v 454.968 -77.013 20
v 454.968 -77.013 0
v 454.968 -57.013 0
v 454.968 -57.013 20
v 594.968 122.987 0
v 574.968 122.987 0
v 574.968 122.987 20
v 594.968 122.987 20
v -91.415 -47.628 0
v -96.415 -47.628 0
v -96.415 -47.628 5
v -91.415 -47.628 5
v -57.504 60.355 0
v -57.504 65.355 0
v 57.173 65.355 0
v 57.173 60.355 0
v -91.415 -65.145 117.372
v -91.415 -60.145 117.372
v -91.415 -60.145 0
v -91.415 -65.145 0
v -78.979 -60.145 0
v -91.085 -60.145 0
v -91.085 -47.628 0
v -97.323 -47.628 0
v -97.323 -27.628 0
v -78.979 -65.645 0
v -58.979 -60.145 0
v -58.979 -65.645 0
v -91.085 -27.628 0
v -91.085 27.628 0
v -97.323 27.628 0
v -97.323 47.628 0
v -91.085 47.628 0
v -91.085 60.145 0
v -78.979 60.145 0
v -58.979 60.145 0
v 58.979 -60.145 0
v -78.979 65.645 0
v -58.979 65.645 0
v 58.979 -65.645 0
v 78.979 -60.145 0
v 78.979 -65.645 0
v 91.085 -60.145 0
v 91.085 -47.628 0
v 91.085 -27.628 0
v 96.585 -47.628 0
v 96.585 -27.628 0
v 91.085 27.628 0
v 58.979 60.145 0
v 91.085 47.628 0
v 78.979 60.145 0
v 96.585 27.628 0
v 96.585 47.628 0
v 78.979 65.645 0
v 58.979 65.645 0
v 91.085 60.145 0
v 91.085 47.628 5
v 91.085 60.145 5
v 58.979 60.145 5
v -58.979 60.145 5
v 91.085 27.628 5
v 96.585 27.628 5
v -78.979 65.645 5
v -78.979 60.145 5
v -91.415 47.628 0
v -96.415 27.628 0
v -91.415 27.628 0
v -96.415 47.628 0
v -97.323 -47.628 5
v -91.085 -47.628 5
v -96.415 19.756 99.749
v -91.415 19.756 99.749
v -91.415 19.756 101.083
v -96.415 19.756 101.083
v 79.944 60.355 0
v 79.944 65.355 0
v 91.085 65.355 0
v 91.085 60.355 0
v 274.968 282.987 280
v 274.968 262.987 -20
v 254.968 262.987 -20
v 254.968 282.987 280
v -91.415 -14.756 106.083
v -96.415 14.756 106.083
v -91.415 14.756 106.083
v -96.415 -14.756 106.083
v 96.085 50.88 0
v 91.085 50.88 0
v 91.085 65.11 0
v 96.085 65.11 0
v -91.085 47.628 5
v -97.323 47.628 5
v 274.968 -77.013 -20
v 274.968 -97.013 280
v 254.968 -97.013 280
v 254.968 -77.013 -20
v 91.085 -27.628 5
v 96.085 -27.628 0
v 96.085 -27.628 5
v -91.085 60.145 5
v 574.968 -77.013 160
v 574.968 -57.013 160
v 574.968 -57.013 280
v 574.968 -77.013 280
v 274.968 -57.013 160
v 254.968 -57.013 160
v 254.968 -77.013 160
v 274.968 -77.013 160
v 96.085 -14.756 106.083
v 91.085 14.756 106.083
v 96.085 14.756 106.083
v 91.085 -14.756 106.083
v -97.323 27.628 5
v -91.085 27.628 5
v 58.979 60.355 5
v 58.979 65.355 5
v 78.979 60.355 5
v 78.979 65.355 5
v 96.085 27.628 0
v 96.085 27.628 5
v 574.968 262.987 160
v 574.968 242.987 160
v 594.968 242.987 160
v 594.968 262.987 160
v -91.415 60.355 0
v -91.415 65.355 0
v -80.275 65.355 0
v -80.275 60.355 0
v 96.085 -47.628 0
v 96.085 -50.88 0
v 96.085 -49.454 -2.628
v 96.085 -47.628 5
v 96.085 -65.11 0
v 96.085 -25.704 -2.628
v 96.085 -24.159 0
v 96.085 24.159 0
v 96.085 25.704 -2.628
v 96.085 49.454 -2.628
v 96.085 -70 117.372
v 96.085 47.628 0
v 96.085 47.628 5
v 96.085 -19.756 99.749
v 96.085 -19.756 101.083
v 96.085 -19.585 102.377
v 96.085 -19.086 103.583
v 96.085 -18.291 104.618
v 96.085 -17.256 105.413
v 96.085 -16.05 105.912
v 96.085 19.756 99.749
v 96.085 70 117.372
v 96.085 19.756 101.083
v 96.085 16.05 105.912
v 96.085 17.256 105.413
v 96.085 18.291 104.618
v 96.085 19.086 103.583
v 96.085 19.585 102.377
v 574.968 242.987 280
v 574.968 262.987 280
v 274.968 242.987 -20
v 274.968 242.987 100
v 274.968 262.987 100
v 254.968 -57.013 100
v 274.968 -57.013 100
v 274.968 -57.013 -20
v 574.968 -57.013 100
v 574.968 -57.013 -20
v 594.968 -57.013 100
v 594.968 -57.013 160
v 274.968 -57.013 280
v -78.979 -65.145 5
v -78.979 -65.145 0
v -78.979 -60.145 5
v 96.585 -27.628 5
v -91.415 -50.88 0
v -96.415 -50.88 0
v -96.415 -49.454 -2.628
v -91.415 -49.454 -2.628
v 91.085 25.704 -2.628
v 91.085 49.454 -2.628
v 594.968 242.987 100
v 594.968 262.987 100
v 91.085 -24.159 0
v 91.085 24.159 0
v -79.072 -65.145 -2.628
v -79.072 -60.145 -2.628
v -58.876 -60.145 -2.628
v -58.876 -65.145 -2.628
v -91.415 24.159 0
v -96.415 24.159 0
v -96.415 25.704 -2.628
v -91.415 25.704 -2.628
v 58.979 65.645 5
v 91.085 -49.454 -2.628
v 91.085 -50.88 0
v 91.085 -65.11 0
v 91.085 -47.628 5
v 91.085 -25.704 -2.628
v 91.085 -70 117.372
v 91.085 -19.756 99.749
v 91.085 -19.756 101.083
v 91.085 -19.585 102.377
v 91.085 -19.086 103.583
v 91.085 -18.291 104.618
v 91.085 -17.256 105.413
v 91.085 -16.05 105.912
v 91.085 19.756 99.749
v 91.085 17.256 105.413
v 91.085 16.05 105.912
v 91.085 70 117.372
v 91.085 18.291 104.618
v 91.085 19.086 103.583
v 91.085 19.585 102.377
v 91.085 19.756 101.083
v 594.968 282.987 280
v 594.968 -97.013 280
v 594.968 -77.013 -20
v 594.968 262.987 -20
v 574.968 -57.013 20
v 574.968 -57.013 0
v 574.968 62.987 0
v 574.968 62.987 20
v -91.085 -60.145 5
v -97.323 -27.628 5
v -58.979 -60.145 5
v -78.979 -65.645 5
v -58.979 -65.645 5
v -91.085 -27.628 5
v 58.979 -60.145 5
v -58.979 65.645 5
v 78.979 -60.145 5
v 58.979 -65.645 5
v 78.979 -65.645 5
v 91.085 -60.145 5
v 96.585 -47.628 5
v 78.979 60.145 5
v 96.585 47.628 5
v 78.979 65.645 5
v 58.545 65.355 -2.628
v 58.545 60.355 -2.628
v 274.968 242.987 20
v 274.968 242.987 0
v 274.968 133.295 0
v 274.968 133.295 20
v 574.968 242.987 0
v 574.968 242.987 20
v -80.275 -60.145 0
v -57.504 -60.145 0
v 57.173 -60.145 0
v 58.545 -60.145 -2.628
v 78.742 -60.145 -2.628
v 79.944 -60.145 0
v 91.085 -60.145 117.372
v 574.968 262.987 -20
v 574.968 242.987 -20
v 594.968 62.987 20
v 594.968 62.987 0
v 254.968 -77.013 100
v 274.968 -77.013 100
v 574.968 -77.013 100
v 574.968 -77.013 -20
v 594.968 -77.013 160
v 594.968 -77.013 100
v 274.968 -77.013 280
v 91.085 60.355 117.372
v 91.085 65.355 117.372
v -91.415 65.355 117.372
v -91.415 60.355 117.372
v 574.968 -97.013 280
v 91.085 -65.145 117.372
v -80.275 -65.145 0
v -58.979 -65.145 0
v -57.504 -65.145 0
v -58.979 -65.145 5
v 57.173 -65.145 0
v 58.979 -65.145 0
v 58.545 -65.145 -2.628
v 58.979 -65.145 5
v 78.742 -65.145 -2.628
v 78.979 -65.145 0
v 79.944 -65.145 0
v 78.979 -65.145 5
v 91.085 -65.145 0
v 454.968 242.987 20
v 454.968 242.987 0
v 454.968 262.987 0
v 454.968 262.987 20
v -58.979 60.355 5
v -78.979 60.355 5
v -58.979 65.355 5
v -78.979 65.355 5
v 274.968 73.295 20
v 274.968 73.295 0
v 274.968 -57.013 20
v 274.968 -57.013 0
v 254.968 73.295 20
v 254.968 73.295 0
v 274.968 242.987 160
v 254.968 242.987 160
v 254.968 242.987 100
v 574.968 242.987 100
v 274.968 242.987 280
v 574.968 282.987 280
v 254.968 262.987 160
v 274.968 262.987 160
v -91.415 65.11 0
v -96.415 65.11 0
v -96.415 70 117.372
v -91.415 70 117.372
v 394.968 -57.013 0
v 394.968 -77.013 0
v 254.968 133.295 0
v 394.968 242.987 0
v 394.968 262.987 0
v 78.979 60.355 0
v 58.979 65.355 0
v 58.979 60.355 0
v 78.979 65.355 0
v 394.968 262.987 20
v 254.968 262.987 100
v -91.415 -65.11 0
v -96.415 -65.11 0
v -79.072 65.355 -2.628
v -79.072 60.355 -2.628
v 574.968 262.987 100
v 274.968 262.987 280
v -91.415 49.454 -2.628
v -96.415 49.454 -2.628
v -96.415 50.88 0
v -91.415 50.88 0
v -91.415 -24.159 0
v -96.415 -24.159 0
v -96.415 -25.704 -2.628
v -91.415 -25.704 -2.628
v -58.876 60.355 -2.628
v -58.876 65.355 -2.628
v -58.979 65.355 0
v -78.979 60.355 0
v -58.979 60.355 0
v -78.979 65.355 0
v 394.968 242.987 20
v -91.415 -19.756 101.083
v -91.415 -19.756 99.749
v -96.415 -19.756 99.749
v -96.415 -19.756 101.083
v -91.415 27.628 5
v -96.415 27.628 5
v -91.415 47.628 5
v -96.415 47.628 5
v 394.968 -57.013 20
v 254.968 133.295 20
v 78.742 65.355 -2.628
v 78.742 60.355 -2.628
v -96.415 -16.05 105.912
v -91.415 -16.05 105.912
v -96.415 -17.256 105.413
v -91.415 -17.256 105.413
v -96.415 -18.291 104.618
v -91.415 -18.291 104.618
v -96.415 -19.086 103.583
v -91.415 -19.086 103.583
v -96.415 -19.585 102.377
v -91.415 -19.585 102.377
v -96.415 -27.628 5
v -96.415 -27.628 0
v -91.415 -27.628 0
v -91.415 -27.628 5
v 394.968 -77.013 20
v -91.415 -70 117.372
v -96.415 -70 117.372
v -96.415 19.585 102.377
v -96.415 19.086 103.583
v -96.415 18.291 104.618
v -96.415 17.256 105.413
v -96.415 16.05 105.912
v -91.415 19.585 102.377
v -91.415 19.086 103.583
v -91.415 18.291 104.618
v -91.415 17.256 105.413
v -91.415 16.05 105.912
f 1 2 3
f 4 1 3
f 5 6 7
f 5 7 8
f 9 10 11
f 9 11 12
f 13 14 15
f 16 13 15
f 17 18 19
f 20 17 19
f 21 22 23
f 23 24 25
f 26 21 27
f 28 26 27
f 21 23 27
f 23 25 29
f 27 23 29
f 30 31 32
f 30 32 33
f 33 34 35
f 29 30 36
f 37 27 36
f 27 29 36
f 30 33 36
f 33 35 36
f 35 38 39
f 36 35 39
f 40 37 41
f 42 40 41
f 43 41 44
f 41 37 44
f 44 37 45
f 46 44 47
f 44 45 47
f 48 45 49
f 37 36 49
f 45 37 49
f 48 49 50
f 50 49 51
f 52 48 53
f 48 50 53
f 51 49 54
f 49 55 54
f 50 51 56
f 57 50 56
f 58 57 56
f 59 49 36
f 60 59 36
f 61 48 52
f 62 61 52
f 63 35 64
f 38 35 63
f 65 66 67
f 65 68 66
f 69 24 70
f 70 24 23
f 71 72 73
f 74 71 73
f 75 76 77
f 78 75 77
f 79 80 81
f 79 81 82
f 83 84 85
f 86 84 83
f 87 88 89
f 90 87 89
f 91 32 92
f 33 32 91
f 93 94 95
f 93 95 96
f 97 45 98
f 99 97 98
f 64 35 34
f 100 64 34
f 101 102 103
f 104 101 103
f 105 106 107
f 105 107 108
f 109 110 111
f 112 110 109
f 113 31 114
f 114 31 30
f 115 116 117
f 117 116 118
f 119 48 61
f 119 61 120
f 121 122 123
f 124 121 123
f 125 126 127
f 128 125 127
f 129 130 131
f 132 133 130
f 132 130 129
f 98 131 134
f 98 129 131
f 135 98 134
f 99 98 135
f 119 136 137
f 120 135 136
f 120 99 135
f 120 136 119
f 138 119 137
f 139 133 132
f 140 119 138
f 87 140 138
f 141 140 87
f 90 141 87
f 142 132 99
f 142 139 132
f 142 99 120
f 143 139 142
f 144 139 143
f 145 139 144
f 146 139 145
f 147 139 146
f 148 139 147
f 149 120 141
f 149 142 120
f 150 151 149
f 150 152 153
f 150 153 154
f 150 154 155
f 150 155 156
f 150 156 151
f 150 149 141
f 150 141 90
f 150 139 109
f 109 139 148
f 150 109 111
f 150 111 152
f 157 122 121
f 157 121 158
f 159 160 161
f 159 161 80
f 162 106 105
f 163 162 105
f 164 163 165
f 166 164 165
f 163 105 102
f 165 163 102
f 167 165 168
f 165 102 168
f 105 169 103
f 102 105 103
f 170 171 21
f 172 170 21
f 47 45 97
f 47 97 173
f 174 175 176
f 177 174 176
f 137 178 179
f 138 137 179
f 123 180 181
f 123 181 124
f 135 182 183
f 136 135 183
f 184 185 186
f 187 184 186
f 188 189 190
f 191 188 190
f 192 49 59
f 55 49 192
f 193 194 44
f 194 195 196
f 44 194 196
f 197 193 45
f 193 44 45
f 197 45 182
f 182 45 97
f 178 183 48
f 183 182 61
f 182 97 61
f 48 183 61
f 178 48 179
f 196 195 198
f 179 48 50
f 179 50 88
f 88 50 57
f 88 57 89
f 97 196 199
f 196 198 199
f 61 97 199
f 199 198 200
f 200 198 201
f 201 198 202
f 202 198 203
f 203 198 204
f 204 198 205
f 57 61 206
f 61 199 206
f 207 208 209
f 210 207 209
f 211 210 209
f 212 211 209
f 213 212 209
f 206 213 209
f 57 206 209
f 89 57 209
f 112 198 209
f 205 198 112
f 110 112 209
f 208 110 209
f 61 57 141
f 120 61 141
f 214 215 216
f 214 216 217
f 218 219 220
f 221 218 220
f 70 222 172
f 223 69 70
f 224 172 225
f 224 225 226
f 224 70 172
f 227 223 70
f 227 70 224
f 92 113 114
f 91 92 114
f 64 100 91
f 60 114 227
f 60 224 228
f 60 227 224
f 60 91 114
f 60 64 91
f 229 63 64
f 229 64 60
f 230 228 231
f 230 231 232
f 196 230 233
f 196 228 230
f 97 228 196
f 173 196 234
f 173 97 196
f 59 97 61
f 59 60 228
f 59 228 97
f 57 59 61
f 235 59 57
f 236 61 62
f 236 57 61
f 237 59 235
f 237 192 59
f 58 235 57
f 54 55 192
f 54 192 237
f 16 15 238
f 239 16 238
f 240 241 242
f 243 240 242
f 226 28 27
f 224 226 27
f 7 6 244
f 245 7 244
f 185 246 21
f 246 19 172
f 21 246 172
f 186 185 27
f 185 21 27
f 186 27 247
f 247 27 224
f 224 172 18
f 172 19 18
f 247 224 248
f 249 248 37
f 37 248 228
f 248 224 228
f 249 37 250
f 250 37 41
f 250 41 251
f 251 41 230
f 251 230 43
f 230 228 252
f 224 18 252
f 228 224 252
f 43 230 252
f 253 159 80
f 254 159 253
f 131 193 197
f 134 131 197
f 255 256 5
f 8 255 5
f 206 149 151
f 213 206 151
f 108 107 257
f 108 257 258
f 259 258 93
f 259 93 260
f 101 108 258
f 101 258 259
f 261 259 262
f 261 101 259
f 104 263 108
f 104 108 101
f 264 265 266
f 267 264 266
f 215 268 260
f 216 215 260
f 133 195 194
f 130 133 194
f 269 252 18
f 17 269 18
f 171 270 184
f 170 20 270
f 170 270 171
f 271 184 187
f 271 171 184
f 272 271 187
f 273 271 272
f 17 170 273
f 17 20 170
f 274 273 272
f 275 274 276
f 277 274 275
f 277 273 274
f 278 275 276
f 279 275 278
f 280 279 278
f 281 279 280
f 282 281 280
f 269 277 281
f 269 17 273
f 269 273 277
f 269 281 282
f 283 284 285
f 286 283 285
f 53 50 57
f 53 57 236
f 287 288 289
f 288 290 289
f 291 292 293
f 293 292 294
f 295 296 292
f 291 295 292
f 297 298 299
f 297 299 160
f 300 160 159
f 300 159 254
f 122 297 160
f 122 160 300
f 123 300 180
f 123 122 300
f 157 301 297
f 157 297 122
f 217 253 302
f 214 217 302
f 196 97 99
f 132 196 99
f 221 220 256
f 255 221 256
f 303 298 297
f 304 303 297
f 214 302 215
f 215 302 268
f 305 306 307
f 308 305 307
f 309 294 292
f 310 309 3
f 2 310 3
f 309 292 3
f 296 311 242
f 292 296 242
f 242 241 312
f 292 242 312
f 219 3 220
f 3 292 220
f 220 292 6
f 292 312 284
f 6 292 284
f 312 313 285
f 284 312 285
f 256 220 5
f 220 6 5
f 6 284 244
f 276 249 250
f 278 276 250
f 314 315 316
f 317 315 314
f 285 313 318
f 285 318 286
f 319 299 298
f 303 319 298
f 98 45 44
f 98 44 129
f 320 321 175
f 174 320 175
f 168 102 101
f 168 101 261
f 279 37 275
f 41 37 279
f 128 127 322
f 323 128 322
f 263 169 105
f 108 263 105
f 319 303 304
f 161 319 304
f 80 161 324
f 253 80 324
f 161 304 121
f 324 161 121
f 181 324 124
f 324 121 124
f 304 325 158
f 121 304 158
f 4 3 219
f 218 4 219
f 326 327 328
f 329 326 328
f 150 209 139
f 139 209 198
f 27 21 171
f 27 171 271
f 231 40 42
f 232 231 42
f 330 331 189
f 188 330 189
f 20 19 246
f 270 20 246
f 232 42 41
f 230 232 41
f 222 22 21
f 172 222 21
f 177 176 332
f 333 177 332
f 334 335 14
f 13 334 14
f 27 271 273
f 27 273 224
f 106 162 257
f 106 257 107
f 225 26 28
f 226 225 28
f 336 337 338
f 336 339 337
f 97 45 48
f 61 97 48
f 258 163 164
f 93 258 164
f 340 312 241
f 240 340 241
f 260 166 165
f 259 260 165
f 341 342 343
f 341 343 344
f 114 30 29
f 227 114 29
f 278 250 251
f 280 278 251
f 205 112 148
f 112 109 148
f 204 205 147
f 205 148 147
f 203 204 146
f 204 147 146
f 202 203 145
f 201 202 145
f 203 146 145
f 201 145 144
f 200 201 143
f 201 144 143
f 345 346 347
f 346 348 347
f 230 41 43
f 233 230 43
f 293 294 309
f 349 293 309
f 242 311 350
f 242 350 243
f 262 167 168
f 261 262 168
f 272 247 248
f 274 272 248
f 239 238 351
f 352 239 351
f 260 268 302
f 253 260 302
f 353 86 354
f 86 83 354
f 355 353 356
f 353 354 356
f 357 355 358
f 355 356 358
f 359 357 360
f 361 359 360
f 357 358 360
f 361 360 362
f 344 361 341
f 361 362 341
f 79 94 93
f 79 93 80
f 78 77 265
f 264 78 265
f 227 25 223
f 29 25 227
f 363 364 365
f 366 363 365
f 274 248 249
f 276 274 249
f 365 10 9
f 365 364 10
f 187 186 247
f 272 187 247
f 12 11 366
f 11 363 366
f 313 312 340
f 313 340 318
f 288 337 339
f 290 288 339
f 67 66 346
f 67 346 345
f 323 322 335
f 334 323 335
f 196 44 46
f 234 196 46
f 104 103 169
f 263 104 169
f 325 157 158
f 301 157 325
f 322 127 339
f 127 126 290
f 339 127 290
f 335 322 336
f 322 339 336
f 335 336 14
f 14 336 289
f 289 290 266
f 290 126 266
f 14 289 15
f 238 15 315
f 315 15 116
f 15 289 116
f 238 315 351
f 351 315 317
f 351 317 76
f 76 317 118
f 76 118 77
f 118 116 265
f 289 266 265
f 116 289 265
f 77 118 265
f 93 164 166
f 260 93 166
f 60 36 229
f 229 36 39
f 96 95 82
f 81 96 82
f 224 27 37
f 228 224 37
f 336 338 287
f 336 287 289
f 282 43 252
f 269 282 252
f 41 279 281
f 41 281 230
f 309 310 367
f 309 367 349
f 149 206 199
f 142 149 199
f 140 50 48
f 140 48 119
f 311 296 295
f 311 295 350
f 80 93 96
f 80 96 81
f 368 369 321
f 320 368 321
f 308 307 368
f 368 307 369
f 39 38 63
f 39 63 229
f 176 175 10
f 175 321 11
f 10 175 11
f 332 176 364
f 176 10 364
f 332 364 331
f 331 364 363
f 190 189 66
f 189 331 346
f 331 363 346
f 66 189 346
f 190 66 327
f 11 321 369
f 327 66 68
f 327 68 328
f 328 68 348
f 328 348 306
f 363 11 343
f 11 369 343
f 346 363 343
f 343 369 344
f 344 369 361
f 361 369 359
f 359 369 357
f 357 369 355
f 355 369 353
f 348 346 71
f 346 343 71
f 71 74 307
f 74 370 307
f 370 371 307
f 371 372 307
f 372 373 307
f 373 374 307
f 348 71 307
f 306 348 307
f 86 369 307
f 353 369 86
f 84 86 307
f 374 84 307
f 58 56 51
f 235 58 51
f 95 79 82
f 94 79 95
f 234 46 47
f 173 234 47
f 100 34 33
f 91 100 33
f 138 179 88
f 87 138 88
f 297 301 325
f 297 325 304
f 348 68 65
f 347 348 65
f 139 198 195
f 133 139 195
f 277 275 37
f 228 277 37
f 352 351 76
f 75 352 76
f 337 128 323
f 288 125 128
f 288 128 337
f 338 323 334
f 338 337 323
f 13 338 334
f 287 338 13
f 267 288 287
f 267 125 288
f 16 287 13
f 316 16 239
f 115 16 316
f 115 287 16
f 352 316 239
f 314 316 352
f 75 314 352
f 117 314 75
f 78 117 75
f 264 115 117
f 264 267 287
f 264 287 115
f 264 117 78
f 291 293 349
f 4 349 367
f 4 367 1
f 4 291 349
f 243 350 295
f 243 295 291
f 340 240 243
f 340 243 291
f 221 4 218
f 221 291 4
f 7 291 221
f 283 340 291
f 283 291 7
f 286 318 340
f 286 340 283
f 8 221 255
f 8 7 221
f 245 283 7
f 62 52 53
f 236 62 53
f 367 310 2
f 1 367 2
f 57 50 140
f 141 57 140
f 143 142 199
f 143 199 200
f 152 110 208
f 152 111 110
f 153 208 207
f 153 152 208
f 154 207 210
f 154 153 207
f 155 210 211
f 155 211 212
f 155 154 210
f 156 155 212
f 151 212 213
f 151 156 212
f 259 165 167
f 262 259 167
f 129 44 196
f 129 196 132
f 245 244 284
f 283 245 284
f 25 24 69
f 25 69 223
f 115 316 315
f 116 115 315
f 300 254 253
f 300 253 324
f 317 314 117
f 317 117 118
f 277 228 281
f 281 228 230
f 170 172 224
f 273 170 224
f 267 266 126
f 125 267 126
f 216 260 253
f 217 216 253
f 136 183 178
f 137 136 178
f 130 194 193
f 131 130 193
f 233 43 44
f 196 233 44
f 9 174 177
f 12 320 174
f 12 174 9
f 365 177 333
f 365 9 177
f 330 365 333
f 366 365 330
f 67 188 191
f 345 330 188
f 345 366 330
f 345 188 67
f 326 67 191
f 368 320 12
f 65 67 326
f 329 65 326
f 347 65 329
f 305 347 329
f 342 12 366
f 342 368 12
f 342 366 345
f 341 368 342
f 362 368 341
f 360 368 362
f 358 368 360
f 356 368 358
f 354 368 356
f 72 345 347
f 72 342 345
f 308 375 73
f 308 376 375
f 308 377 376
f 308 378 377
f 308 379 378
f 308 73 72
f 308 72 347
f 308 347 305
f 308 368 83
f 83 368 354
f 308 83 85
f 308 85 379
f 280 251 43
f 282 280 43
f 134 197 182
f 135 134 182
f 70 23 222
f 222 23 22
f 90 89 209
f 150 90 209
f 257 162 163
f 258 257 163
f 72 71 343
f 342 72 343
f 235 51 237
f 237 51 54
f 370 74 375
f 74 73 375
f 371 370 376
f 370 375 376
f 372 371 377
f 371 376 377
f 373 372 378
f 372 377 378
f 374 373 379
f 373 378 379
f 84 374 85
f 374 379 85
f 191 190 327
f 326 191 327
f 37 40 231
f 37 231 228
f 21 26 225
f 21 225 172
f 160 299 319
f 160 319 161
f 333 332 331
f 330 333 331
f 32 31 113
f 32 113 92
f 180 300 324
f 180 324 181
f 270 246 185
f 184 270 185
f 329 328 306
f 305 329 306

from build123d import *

# Parameters (mm, degrees)
F0_W      = 20
F0_H      = 5.5
F0_W_2    = 5.5
F0_H_2    = 20
F0_W_3    = 6.2382672471
F0_W_4    = 4.7617327529
F0_H_3    = 7.058719861
F1_DEPTH  = 5
F3_DEPTH  = 5
F6_DEPTH  = 5
F10_W     = 39.5112484694
F10_H     = 6.334066391
F11_DEPTH = 192.5
F12_R     = 5
F12_2_R   = 5
F13_W     = 20
F13_H     = 60
F13_W_2   = 60
F13_H_2   = 20
F14_DEPTH = 20
F15_W     = 20
F15_H     = 60
F15_W_2   = 120
F15_H_2   = 20
F16_DEPTH = 20
F19_W     = 20
F19_H     = 120
F20_DEPTH = 20


with BuildPart() as f1:
    # F0 (on Top) → F1 (new body)
    with BuildSketch(Plane.XY):
        Polygon((78.9788460732, -60.1447808916), (91.0846347042, -60.1447808916), (91.0846347042, -47.6279838383), (91.0846347042, -27.6279838383), (91.0846347042, 27.6279838383), (85.5846347042, 27.6279838383), (85.5846347042, 47.6279838383), (91.0846347042, 47.6279838383), (91.0846347042, 60.1447808916), (78.9788460732, 60.1447808916), (78.9788460732, 54.6447808916), (58.9788460732, 54.6447808916), (58.9788460732, 60.1447808916), (-58.9788460732, 60.1447808916), (-58.9788460732, 53.0860610306), (-78.9788460732, 53.0860610306), (-78.9788460732, 60.1447808916), (-91.0846347042, 60.1447808916), (-91.0846347042, 47.6279838383), (-86.3229019513, 47.6279838383), (-86.3229019513, 27.6279838383), (-91.0846347042, 27.6279838383), (-91.0846347042, -27.6279838383), (-91.0846347042, -47.6279838383), (-91.0846347042, -60.1447808916), (-78.9788460732, -60.1447808916), (-58.9788460732, -60.1447808916), (58.9788460732, -60.1447808916), (58.9788460732, -54.6447808916), (78.9788460732, -54.6447808916), align=None)
        with Locations((68.9788460732, -62.8947808916)):
            Rectangle(F0_W, F0_H)
        with Locations((68.9788460732, -57.3947808916)):
            Rectangle(F0_W, F0_H)
        with Locations((93.8346347042, -37.6279838383)):
            Rectangle(F0_W_2, F0_H_2)
        with Locations((-68.9788460732, -62.8947808916)):
            Rectangle(F0_W, F0_H)
        with Locations((88.3346347042, 37.6279838383)):
            Rectangle(F0_W_2, F0_H_2)
        with Locations((93.8346347042, 37.6279838383)):
            Rectangle(F0_W_2, F0_H_2)
        with Locations((-94.2037683277, -37.6279838383)):
            Rectangle(F0_W_3, F0_H_2)
        with Locations((68.9788460732, 57.3947808916)):
            Rectangle(F0_W, F0_H)
        with Locations((68.9788460732, 62.8947808916)):
            Rectangle(F0_W, F0_H)
        with Locations((-94.2037683277, 37.6279838383)):
            Rectangle(F0_W_3, F0_H_2)
        with Locations((-88.7037683277, 37.6279838383)):
            Rectangle(F0_W_4, F0_H_2)
        with Locations((-68.9788460732, 56.6154209611)):
            Rectangle(F0_W, F0_H_3)
        with Locations((-68.9788460732, 62.8947808916)):
            Rectangle(F0_W, F0_H)
    extrude(amount=F1_DEPTH)


with BuildPart() as f3:
    # F2 (on face) → F3 (new body)
    with BuildSketch(Plane.YZ.offset(91.0846347042)):
        Polygon((-50.8797168732, 0), (-49.4536261749, -2.6282228064), (-25.7040392607, -2.6282228064), (-24.1590496153, 0), (24.1590496153, 0), (25.7040392607, -2.6282228064), (49.4536261749, -2.6282228064), (50.8797168732, 0), (65, 0), (65, 117.3717771936), (-65, 117.3717771936), (-65, 0), (-60.1447808916, 0), (-60.1447808916, 5), (-47.6279838383, 5), (-47.6279838383, 0), align=None)
        Polygon((-60.1447808916, 0), (-50.8797168732, 0), (-47.6279838383, 0), (-47.6279838383, 5), (-60.1447808916, 5), align=None)
        Polygon((-65.1095092836, 0), (-65, 0), (-65, 117.3717771936), (-70, 117.3717771936), align=None)
        Polygon((70, 117.3717771936), (65, 117.3717771936), (65, 0), (65.1095092836, 0), align=None)
    extrude(amount=F3_DEPTH)


with BuildPart() as f4_1:
    # F4: copy of F3
    add(f3.part.moved(Location((-187.5, 0, 0))))

    # F8: cut F1
    add(f1.part, mode=Mode.SUBTRACT)


with BuildPart() as f6:
    # F5 (on face) → F6 (new body)
    with BuildSketch(Plane.XZ.offset(60.1447808916)):
        Polygon((-80.2751630545, 0), (-79.0724977851, -2.6282228064), (-58.8756129146, -2.6282228064), (-57.5041547418, 0), (57.1734241501, 0), (58.5448823229, -2.6282228064), (78.7417671934, -2.6282228064), (79.9444324628, 0), (91.0846347042, 0), (91.0846347042, 117.3717771936), (-91.4153652958, 117.3717771936), (-91.4153652958, 0), (-91.0846347042, 0), (-91.0846347042, 5), (-78.9788460732, 5), (-78.9788460732, 0), align=None)
        Polygon((-91.0846347042, 0), (-80.2751630545, 0), (-78.9788460732, 0), (-78.9788460732, 5), (-91.0846347042, 5), align=None)
    extrude(amount=F6_DEPTH)


with BuildPart() as f7_1:
    # F7: copy of F6
    add(f6.part.moved(Location((0, 125.5, 0))))

    # F8: cut F1
    add(f1.part, mode=Mode.SUBTRACT)

    # F9: cut F1
    add(f1.part, mode=Mode.SUBTRACT)


with BuildPart() as f3_1:
    add(f3.part)

    # F8: cut F1
    add(f1.part, mode=Mode.SUBTRACT)


with BuildPart() as f6_1:
    add(f6.part)

    # F8: cut F1
    add(f1.part, mode=Mode.SUBTRACT)

    # F9: cut F1
    add(f1.part, mode=Mode.SUBTRACT)


with BuildPart() as f11_tool:
    # F10 (on face) → F11 (new body, through all)
    with BuildSketch(Plane(origin=(-96.4153652958, 0, 0), x_dir=(0, -1, 0), z_dir=(-1, 0, 0))):
        with Locations((0, 102.915585041)):
            Rectangle(F10_W, F10_H)
    extrude(amount=-F11_DEPTH)


with BuildPart() as f3_2:
    add(f3_1.part)

    # F11: cut by f11_tool
    add(f11_tool.part, mode=Mode.SUBTRACT)

    # F12
    f12_edges = [f3_2.edges().sort_by_distance(p)[0] for p in [
        (93.584635, 19.755624, 106.082618),
        (93.584635, -19.755624, 106.082618),
    ]]
    fillet(f12_edges, radius=F12_R)


with BuildPart() as f4_1_1:
    add(f4_1.part)

    # F11: cut by f11_tool
    add(f11_tool.part, mode=Mode.SUBTRACT)

    # F12#2
    f12_2_edges = [f4_1_1.edges().sort_by_distance(p)[0] for p in [
        (-93.915365, 19.755624, 106.082618),
        (-93.915365, -19.755624, 106.082618),
    ]]
    fillet(f12_2_edges, radius=F12_2_R)


with BuildPart() as f14:
    # F13 (on Top) → F14 (new body)
    with BuildSketch(Plane.XY):
        Polygon((394.9682962894, 242.9871472716), (274.9682962894, 242.9871472716), (274.9682962894, 133.2951399684), (294.9682962894, 133.2951399684), (294.9682962894, 73.2951399684), (274.9682962894, 73.2951399684), (274.9682962894, -57.0128527284), (394.9682962894, -57.0128527284), (394.9682962894, -37.0128527284), (454.9682962894, -37.0128527284), (454.9682962894, -57.0128527284), (574.9682962894, -57.0128527284), (574.9682962894, 62.9871472716), (554.9682962894, 62.9871472716), (554.9682962894, 122.9871472716), (574.9682962894, 122.9871472716), (574.9682962894, 242.9871472716), (454.9682962894, 242.9871472716), (454.9682962894, 222.9871472716), (394.9682962894, 222.9871472716), align=None)
        with Locations((264.9682962894, 103.2951399684)):
            Rectangle(F13_W, F13_H)
        with Locations((424.9682962894, 252.9871472716)):
            Rectangle(F13_W_2, F13_H_2)
        with Locations((584.9682962894, 92.9871472716)):
            Rectangle(F13_W, F13_H)
        with Locations((424.9682962894, -67.0128527284)):
            Rectangle(F13_W_2, F13_H_2)
        with Locations((424.9682962894, -47.0128527284)):
            Rectangle(F13_W_2, F13_H_2)
        with Locations((564.9682962894, 92.9871472716)):
            Rectangle(F13_W, F13_H)
        with Locations((424.9682962894, 232.9871472716)):
            Rectangle(F13_W_2, F13_H_2)
        with Locations((284.9682962894, 103.2951399684)):
            Rectangle(F13_W, F13_H)
    extrude(amount=F14_DEPTH)


with BuildPart() as f16:
    # F15 (on face) → F16 (new body)
    with BuildSketch(Plane.XZ.offset(57.0128527284)):
        with Locations((264.9682962894, 130)):
            Rectangle(F15_W, F15_H)
        Polygon((274.9682962894, 0), (274.9682962894, -20), (574.9682962894, -20), (574.9682962894, 100), (554.9682962894, 100), (554.9682962894, 160), (574.9682962894, 160), (574.9682962894, 280), (274.9682962894, 280), (274.9682962894, 160), (294.9682962894, 160), (294.9682962894, 100), (274.9682962894, 100), (274.9682962894, 20), (394.9682962894, 20), (394.9682962894, 0), align=None)
        with Locations((584.9682962894, 130)):
            Rectangle(F15_W, F15_H)
        with Locations((564.9682962894, 130)):
            Rectangle(F15_W, F15_H)
        with Locations((284.9682962894, 130)):
            Rectangle(F15_W, F15_H)
        with Locations((334.9682962894, 10)):
            Rectangle(F15_W_2, F15_H_2)
    extrude(amount=F16_DEPTH)


with BuildPart() as f18_1:
    # F18: instance of F16
    add(f16.part.mirror(Plane(origin=(424.9682962894, 92.9871472716, 130), x_dir=(1, 0, 0), z_dir=(0, 1, 0))))


with BuildPart() as f20:
    # F19 (on face) → F20 (new body)
    with BuildSketch(Plane.YZ.offset(574.9682962894)):
        with Locations((-67.0128527284, 220)):
            Rectangle(F19_W, F19_H)
        Polygon((-77.0128527284, 280), (-97.0128527284, 280), (-77.0128527284, -20), (262.9871472716, -20), (282.9871472716, 280), (-57.0128527284, 280), (-57.0128527284, 160), (-77.0128527284, 160), align=None)
    extrude(amount=F20_DEPTH)


with BuildPart() as f22_1:
    # F22: instance of F20
    add(f20.part.mirror(Plane(origin=(424.9682962894, 8.14114362, 10), x_dir=(0, -1, 0), z_dir=(-1, 0, 0))))


solid = Compound([f1.part, f7_1.part, f6_1.part, f3_2.part, f4_1_1.part, f14.part, f16.part, f18_1.part, f20.part, f22_1.part])
